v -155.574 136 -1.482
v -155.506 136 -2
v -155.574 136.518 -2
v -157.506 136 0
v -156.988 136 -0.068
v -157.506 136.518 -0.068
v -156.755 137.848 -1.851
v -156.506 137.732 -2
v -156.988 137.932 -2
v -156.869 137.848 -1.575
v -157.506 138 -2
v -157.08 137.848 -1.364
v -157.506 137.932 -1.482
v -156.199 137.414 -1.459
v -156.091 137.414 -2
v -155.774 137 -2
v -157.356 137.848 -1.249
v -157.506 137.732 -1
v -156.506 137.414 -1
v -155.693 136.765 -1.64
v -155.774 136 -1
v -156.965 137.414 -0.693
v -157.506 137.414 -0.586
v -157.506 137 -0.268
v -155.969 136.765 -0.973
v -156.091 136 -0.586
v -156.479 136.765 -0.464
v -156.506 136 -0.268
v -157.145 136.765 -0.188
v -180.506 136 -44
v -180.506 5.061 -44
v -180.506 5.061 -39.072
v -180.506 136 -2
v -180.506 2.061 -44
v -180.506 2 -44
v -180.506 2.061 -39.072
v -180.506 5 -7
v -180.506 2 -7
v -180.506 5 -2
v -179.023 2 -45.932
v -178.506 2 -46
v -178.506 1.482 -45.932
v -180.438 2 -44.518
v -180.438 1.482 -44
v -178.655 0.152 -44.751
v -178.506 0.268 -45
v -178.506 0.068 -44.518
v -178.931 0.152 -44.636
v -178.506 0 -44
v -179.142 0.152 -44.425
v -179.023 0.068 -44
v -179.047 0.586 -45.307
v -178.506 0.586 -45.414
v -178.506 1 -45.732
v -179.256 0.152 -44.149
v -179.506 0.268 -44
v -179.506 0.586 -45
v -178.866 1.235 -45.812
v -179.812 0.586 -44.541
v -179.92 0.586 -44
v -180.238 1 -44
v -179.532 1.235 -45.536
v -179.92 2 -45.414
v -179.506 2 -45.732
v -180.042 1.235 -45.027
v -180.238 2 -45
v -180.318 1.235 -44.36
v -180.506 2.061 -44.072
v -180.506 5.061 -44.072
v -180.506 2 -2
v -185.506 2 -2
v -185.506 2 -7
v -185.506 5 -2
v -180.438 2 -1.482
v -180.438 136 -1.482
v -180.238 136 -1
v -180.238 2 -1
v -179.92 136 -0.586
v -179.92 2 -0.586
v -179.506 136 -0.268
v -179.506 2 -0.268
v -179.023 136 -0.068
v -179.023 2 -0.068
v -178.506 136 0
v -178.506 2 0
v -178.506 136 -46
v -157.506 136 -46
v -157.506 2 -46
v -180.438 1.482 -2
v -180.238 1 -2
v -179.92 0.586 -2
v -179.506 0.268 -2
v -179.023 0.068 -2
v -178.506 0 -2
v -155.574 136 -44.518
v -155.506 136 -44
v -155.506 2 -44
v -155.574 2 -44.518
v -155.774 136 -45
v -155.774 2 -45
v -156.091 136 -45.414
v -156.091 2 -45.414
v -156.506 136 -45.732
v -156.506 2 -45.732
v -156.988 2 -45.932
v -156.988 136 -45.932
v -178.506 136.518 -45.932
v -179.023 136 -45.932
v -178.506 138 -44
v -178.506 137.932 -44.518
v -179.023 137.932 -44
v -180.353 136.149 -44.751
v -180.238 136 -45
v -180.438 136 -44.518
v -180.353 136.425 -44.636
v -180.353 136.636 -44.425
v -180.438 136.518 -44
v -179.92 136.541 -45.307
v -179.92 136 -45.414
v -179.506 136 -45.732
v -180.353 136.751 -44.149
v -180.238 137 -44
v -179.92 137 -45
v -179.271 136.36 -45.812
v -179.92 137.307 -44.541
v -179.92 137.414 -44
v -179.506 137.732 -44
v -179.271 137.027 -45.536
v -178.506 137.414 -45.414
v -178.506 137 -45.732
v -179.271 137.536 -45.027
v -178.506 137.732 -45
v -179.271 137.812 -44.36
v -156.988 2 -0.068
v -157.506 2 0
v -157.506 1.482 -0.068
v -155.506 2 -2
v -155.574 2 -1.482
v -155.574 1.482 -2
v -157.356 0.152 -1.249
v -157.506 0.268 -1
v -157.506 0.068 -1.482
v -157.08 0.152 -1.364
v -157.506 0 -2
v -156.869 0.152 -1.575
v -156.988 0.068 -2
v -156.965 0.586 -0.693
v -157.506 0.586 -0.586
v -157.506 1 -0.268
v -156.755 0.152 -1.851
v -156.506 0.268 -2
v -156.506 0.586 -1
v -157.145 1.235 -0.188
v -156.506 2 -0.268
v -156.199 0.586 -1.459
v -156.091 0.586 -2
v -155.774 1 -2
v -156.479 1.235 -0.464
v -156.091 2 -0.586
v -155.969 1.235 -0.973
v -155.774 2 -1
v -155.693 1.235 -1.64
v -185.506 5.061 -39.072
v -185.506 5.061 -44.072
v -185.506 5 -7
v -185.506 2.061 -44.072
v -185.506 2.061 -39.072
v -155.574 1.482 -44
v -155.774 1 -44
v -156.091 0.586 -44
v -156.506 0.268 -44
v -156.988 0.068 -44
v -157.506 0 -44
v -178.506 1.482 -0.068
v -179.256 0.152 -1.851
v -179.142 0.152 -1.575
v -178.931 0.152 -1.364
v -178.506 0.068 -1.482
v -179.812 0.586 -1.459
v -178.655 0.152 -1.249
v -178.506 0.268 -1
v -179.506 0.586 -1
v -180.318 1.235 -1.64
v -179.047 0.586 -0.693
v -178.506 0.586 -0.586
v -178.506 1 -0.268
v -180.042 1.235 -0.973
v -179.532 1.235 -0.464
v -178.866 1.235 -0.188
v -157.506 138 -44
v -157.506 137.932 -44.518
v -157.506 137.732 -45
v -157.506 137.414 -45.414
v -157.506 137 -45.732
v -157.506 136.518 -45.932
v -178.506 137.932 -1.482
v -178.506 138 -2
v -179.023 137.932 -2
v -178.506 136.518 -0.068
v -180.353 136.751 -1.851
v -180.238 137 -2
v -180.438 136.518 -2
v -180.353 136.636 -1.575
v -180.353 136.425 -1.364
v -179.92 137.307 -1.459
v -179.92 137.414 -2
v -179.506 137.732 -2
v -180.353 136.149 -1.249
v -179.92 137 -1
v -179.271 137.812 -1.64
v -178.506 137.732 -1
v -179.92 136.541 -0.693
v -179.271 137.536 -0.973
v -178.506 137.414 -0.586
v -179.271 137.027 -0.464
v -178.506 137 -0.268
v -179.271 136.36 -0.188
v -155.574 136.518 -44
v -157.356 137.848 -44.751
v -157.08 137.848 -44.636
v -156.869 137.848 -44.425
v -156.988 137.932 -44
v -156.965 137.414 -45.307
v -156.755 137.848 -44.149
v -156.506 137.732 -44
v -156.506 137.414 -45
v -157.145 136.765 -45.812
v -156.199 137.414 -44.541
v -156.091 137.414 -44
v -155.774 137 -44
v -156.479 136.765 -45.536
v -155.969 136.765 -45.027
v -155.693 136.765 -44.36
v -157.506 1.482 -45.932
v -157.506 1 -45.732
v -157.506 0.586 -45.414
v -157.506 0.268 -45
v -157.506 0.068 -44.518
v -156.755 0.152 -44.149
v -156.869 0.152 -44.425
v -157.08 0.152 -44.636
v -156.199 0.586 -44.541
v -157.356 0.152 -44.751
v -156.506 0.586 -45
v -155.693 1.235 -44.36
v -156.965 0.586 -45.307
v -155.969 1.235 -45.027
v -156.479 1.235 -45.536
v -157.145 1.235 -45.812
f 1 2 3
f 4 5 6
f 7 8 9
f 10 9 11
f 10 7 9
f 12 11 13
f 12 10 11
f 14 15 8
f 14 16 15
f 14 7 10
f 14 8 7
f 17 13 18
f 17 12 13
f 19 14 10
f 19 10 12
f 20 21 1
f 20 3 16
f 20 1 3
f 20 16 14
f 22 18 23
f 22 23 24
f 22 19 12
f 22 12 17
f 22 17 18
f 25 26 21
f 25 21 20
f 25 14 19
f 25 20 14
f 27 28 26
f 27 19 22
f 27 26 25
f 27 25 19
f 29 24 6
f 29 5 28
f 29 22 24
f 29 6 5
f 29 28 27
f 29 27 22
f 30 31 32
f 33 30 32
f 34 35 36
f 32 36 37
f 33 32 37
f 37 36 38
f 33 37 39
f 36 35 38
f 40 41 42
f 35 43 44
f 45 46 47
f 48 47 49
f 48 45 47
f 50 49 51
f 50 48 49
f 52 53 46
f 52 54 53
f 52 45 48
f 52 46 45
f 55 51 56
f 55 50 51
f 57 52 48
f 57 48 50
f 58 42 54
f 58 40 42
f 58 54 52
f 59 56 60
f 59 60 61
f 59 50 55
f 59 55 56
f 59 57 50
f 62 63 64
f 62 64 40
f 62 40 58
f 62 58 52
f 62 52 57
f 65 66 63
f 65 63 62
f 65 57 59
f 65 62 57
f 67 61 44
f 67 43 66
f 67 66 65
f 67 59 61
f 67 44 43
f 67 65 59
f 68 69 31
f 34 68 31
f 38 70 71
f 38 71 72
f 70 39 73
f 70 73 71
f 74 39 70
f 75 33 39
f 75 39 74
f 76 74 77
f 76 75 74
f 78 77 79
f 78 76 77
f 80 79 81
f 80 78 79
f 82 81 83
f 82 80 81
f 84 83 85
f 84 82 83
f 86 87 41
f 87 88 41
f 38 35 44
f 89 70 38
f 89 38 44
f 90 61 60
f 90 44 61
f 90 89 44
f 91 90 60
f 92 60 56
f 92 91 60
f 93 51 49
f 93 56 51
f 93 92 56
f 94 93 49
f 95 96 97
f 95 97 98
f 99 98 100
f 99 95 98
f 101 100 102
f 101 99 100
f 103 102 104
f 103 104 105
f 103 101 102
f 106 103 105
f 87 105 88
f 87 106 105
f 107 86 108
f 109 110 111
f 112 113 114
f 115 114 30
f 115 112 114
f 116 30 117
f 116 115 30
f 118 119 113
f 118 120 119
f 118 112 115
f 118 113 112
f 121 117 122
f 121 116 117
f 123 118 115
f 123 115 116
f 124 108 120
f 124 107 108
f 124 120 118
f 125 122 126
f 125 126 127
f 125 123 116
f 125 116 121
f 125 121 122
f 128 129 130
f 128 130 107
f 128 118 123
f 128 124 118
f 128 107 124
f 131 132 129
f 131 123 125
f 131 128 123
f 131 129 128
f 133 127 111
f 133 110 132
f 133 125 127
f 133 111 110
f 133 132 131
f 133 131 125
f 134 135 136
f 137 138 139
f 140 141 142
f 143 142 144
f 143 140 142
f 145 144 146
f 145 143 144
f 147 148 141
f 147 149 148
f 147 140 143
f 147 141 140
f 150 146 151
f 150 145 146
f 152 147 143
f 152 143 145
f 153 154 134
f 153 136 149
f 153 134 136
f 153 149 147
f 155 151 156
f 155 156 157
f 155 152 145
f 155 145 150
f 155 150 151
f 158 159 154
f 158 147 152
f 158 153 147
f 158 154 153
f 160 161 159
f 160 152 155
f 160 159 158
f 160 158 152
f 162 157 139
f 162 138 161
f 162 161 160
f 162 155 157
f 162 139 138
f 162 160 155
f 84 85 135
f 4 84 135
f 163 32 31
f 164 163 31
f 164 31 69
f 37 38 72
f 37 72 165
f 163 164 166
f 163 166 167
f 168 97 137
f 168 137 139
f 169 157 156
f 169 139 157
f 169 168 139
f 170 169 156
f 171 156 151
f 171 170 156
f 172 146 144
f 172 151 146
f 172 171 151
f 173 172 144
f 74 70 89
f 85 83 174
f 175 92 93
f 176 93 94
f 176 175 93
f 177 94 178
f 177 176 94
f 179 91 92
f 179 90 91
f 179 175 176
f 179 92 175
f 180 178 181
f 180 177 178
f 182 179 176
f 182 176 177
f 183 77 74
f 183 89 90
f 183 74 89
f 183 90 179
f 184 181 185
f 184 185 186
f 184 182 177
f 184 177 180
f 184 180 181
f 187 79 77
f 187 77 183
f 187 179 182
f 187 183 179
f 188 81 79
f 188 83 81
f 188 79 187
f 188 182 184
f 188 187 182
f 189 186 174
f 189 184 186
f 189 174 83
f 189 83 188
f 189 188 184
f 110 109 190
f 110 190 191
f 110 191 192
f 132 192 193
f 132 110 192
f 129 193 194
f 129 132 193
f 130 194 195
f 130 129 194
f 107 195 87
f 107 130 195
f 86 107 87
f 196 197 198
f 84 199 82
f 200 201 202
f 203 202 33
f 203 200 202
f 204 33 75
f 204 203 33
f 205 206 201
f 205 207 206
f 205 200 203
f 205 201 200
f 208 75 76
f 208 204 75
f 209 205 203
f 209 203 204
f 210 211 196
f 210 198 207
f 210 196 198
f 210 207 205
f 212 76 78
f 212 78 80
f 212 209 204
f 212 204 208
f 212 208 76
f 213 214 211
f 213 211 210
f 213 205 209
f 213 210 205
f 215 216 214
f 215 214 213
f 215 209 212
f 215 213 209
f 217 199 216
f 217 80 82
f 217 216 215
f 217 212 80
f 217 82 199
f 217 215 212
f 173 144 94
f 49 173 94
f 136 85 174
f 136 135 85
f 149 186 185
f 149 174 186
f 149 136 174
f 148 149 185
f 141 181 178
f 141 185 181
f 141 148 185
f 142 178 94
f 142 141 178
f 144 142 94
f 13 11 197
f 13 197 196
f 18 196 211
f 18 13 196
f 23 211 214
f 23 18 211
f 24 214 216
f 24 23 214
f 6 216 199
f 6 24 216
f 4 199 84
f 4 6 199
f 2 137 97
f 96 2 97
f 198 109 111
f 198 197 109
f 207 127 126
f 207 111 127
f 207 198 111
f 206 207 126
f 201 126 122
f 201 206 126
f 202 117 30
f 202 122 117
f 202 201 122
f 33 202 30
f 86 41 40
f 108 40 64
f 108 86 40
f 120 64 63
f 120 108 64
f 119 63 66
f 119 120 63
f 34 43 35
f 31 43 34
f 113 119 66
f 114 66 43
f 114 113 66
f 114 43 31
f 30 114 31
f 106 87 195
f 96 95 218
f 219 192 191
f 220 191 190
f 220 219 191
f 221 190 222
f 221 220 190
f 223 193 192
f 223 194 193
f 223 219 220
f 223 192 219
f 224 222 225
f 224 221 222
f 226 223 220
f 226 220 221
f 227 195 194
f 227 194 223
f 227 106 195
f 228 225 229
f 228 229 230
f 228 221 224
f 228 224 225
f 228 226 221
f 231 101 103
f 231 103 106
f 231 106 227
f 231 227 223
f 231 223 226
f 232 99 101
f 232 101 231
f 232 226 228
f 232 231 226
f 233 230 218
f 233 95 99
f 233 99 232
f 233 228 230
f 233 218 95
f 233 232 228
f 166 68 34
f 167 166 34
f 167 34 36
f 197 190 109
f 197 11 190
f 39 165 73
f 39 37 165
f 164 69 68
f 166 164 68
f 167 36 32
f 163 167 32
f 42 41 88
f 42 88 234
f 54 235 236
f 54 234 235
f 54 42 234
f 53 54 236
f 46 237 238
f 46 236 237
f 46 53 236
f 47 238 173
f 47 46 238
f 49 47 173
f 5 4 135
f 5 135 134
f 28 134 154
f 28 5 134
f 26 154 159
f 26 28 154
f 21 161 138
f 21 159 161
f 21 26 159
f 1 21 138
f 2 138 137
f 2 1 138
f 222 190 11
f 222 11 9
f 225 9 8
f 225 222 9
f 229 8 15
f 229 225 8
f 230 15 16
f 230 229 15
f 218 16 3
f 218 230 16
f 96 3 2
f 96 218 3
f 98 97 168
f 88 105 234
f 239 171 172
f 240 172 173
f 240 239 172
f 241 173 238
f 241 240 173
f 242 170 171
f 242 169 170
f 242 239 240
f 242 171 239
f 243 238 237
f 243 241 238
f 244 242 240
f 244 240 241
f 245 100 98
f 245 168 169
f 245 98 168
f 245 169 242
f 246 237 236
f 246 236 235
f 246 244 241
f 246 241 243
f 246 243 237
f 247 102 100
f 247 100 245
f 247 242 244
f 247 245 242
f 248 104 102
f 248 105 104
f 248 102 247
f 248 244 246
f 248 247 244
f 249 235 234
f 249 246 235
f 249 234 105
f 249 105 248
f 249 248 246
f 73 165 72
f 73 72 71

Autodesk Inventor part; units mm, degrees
ref_plane "YZ Plane" through (0, 0, 0) normal (1, 0, 0) x (0, 1, 0)
ref_plane "XZ Plane" through (0, 0, 0) normal (0, 1, 0) x (-1, 0, 0)
ref_plane "XY Plane" through (0, 0, 0) normal (0, 0, 1) x (1, 0, 0)
sketch "Эскиз1" plane through (0, 0, 0) normal (0, 1, 0) x (-1, 0, 0)
  line L0 (180.5057, 0) -> (155.5057, 0)
  line L1 (155.5057, 0) -> (155.5057, -46)
  line L2 (155.5057, -46) -> (180.5057, -46)
  line L3 (180.5057, -46) -> (180.5057, 0)
  point P0 (0, 0)
  dimension "d0" = 25
  dimension "d1" = 46
extrude "Выдавливание1" add sketch "Эскиз1" along normal blind 138
fillet "Сопряжение1" radius 2 12 edges at (-155.5057, 69, 0) (-155.5057, 69, -46) (-155.5057, 138, -23) (-155.5057, 0, -23) (-168.0057, 138, 0) (-168.0057, 138, -46) (-180.5057, 138, -23) (-180.5057, 69, 0) (-180.5057, 69, -46) (-180.5057, 0, -23) (-168.0057, 0, 0) (-168.0057, 0, -46)
sketch "Эскиз2" plane through (-180.5057, 2, -2) normal (-1, 0, 0) x (0, 0, 1)
  line L0 (-42.0719, 0.0612) -> (-37.0719, 0.0612)
  line L1 (-37.0719, 0.0612) -> (-37.0719, 3.0612)
  line L2 (-37.0719, 3.0612) -> (-42.0719, 3.0612)
  line L3 (-42.0719, 3.0612) -> (-42.0719, 0.0612)
  line L4 (0, 0) -> (-42, 0) projected
  line L5 (0, 0) -> (-5, 0)
  line L6 (-5, 0) -> (-5, 3)
  line L7 (-5, 3) -> (0, 3)
  line L8 (0, 3) -> (0, 0)
  point P0 (2, -2)
  dimension "d5" = 5
  dimension "d6" = 3
  dimension "d7" = 5
  dimension "d8" = 3
extrude "Выдавливание2" add sketch "Эскиз2" along normal blind 5
properties part number "Аккумулятор"
